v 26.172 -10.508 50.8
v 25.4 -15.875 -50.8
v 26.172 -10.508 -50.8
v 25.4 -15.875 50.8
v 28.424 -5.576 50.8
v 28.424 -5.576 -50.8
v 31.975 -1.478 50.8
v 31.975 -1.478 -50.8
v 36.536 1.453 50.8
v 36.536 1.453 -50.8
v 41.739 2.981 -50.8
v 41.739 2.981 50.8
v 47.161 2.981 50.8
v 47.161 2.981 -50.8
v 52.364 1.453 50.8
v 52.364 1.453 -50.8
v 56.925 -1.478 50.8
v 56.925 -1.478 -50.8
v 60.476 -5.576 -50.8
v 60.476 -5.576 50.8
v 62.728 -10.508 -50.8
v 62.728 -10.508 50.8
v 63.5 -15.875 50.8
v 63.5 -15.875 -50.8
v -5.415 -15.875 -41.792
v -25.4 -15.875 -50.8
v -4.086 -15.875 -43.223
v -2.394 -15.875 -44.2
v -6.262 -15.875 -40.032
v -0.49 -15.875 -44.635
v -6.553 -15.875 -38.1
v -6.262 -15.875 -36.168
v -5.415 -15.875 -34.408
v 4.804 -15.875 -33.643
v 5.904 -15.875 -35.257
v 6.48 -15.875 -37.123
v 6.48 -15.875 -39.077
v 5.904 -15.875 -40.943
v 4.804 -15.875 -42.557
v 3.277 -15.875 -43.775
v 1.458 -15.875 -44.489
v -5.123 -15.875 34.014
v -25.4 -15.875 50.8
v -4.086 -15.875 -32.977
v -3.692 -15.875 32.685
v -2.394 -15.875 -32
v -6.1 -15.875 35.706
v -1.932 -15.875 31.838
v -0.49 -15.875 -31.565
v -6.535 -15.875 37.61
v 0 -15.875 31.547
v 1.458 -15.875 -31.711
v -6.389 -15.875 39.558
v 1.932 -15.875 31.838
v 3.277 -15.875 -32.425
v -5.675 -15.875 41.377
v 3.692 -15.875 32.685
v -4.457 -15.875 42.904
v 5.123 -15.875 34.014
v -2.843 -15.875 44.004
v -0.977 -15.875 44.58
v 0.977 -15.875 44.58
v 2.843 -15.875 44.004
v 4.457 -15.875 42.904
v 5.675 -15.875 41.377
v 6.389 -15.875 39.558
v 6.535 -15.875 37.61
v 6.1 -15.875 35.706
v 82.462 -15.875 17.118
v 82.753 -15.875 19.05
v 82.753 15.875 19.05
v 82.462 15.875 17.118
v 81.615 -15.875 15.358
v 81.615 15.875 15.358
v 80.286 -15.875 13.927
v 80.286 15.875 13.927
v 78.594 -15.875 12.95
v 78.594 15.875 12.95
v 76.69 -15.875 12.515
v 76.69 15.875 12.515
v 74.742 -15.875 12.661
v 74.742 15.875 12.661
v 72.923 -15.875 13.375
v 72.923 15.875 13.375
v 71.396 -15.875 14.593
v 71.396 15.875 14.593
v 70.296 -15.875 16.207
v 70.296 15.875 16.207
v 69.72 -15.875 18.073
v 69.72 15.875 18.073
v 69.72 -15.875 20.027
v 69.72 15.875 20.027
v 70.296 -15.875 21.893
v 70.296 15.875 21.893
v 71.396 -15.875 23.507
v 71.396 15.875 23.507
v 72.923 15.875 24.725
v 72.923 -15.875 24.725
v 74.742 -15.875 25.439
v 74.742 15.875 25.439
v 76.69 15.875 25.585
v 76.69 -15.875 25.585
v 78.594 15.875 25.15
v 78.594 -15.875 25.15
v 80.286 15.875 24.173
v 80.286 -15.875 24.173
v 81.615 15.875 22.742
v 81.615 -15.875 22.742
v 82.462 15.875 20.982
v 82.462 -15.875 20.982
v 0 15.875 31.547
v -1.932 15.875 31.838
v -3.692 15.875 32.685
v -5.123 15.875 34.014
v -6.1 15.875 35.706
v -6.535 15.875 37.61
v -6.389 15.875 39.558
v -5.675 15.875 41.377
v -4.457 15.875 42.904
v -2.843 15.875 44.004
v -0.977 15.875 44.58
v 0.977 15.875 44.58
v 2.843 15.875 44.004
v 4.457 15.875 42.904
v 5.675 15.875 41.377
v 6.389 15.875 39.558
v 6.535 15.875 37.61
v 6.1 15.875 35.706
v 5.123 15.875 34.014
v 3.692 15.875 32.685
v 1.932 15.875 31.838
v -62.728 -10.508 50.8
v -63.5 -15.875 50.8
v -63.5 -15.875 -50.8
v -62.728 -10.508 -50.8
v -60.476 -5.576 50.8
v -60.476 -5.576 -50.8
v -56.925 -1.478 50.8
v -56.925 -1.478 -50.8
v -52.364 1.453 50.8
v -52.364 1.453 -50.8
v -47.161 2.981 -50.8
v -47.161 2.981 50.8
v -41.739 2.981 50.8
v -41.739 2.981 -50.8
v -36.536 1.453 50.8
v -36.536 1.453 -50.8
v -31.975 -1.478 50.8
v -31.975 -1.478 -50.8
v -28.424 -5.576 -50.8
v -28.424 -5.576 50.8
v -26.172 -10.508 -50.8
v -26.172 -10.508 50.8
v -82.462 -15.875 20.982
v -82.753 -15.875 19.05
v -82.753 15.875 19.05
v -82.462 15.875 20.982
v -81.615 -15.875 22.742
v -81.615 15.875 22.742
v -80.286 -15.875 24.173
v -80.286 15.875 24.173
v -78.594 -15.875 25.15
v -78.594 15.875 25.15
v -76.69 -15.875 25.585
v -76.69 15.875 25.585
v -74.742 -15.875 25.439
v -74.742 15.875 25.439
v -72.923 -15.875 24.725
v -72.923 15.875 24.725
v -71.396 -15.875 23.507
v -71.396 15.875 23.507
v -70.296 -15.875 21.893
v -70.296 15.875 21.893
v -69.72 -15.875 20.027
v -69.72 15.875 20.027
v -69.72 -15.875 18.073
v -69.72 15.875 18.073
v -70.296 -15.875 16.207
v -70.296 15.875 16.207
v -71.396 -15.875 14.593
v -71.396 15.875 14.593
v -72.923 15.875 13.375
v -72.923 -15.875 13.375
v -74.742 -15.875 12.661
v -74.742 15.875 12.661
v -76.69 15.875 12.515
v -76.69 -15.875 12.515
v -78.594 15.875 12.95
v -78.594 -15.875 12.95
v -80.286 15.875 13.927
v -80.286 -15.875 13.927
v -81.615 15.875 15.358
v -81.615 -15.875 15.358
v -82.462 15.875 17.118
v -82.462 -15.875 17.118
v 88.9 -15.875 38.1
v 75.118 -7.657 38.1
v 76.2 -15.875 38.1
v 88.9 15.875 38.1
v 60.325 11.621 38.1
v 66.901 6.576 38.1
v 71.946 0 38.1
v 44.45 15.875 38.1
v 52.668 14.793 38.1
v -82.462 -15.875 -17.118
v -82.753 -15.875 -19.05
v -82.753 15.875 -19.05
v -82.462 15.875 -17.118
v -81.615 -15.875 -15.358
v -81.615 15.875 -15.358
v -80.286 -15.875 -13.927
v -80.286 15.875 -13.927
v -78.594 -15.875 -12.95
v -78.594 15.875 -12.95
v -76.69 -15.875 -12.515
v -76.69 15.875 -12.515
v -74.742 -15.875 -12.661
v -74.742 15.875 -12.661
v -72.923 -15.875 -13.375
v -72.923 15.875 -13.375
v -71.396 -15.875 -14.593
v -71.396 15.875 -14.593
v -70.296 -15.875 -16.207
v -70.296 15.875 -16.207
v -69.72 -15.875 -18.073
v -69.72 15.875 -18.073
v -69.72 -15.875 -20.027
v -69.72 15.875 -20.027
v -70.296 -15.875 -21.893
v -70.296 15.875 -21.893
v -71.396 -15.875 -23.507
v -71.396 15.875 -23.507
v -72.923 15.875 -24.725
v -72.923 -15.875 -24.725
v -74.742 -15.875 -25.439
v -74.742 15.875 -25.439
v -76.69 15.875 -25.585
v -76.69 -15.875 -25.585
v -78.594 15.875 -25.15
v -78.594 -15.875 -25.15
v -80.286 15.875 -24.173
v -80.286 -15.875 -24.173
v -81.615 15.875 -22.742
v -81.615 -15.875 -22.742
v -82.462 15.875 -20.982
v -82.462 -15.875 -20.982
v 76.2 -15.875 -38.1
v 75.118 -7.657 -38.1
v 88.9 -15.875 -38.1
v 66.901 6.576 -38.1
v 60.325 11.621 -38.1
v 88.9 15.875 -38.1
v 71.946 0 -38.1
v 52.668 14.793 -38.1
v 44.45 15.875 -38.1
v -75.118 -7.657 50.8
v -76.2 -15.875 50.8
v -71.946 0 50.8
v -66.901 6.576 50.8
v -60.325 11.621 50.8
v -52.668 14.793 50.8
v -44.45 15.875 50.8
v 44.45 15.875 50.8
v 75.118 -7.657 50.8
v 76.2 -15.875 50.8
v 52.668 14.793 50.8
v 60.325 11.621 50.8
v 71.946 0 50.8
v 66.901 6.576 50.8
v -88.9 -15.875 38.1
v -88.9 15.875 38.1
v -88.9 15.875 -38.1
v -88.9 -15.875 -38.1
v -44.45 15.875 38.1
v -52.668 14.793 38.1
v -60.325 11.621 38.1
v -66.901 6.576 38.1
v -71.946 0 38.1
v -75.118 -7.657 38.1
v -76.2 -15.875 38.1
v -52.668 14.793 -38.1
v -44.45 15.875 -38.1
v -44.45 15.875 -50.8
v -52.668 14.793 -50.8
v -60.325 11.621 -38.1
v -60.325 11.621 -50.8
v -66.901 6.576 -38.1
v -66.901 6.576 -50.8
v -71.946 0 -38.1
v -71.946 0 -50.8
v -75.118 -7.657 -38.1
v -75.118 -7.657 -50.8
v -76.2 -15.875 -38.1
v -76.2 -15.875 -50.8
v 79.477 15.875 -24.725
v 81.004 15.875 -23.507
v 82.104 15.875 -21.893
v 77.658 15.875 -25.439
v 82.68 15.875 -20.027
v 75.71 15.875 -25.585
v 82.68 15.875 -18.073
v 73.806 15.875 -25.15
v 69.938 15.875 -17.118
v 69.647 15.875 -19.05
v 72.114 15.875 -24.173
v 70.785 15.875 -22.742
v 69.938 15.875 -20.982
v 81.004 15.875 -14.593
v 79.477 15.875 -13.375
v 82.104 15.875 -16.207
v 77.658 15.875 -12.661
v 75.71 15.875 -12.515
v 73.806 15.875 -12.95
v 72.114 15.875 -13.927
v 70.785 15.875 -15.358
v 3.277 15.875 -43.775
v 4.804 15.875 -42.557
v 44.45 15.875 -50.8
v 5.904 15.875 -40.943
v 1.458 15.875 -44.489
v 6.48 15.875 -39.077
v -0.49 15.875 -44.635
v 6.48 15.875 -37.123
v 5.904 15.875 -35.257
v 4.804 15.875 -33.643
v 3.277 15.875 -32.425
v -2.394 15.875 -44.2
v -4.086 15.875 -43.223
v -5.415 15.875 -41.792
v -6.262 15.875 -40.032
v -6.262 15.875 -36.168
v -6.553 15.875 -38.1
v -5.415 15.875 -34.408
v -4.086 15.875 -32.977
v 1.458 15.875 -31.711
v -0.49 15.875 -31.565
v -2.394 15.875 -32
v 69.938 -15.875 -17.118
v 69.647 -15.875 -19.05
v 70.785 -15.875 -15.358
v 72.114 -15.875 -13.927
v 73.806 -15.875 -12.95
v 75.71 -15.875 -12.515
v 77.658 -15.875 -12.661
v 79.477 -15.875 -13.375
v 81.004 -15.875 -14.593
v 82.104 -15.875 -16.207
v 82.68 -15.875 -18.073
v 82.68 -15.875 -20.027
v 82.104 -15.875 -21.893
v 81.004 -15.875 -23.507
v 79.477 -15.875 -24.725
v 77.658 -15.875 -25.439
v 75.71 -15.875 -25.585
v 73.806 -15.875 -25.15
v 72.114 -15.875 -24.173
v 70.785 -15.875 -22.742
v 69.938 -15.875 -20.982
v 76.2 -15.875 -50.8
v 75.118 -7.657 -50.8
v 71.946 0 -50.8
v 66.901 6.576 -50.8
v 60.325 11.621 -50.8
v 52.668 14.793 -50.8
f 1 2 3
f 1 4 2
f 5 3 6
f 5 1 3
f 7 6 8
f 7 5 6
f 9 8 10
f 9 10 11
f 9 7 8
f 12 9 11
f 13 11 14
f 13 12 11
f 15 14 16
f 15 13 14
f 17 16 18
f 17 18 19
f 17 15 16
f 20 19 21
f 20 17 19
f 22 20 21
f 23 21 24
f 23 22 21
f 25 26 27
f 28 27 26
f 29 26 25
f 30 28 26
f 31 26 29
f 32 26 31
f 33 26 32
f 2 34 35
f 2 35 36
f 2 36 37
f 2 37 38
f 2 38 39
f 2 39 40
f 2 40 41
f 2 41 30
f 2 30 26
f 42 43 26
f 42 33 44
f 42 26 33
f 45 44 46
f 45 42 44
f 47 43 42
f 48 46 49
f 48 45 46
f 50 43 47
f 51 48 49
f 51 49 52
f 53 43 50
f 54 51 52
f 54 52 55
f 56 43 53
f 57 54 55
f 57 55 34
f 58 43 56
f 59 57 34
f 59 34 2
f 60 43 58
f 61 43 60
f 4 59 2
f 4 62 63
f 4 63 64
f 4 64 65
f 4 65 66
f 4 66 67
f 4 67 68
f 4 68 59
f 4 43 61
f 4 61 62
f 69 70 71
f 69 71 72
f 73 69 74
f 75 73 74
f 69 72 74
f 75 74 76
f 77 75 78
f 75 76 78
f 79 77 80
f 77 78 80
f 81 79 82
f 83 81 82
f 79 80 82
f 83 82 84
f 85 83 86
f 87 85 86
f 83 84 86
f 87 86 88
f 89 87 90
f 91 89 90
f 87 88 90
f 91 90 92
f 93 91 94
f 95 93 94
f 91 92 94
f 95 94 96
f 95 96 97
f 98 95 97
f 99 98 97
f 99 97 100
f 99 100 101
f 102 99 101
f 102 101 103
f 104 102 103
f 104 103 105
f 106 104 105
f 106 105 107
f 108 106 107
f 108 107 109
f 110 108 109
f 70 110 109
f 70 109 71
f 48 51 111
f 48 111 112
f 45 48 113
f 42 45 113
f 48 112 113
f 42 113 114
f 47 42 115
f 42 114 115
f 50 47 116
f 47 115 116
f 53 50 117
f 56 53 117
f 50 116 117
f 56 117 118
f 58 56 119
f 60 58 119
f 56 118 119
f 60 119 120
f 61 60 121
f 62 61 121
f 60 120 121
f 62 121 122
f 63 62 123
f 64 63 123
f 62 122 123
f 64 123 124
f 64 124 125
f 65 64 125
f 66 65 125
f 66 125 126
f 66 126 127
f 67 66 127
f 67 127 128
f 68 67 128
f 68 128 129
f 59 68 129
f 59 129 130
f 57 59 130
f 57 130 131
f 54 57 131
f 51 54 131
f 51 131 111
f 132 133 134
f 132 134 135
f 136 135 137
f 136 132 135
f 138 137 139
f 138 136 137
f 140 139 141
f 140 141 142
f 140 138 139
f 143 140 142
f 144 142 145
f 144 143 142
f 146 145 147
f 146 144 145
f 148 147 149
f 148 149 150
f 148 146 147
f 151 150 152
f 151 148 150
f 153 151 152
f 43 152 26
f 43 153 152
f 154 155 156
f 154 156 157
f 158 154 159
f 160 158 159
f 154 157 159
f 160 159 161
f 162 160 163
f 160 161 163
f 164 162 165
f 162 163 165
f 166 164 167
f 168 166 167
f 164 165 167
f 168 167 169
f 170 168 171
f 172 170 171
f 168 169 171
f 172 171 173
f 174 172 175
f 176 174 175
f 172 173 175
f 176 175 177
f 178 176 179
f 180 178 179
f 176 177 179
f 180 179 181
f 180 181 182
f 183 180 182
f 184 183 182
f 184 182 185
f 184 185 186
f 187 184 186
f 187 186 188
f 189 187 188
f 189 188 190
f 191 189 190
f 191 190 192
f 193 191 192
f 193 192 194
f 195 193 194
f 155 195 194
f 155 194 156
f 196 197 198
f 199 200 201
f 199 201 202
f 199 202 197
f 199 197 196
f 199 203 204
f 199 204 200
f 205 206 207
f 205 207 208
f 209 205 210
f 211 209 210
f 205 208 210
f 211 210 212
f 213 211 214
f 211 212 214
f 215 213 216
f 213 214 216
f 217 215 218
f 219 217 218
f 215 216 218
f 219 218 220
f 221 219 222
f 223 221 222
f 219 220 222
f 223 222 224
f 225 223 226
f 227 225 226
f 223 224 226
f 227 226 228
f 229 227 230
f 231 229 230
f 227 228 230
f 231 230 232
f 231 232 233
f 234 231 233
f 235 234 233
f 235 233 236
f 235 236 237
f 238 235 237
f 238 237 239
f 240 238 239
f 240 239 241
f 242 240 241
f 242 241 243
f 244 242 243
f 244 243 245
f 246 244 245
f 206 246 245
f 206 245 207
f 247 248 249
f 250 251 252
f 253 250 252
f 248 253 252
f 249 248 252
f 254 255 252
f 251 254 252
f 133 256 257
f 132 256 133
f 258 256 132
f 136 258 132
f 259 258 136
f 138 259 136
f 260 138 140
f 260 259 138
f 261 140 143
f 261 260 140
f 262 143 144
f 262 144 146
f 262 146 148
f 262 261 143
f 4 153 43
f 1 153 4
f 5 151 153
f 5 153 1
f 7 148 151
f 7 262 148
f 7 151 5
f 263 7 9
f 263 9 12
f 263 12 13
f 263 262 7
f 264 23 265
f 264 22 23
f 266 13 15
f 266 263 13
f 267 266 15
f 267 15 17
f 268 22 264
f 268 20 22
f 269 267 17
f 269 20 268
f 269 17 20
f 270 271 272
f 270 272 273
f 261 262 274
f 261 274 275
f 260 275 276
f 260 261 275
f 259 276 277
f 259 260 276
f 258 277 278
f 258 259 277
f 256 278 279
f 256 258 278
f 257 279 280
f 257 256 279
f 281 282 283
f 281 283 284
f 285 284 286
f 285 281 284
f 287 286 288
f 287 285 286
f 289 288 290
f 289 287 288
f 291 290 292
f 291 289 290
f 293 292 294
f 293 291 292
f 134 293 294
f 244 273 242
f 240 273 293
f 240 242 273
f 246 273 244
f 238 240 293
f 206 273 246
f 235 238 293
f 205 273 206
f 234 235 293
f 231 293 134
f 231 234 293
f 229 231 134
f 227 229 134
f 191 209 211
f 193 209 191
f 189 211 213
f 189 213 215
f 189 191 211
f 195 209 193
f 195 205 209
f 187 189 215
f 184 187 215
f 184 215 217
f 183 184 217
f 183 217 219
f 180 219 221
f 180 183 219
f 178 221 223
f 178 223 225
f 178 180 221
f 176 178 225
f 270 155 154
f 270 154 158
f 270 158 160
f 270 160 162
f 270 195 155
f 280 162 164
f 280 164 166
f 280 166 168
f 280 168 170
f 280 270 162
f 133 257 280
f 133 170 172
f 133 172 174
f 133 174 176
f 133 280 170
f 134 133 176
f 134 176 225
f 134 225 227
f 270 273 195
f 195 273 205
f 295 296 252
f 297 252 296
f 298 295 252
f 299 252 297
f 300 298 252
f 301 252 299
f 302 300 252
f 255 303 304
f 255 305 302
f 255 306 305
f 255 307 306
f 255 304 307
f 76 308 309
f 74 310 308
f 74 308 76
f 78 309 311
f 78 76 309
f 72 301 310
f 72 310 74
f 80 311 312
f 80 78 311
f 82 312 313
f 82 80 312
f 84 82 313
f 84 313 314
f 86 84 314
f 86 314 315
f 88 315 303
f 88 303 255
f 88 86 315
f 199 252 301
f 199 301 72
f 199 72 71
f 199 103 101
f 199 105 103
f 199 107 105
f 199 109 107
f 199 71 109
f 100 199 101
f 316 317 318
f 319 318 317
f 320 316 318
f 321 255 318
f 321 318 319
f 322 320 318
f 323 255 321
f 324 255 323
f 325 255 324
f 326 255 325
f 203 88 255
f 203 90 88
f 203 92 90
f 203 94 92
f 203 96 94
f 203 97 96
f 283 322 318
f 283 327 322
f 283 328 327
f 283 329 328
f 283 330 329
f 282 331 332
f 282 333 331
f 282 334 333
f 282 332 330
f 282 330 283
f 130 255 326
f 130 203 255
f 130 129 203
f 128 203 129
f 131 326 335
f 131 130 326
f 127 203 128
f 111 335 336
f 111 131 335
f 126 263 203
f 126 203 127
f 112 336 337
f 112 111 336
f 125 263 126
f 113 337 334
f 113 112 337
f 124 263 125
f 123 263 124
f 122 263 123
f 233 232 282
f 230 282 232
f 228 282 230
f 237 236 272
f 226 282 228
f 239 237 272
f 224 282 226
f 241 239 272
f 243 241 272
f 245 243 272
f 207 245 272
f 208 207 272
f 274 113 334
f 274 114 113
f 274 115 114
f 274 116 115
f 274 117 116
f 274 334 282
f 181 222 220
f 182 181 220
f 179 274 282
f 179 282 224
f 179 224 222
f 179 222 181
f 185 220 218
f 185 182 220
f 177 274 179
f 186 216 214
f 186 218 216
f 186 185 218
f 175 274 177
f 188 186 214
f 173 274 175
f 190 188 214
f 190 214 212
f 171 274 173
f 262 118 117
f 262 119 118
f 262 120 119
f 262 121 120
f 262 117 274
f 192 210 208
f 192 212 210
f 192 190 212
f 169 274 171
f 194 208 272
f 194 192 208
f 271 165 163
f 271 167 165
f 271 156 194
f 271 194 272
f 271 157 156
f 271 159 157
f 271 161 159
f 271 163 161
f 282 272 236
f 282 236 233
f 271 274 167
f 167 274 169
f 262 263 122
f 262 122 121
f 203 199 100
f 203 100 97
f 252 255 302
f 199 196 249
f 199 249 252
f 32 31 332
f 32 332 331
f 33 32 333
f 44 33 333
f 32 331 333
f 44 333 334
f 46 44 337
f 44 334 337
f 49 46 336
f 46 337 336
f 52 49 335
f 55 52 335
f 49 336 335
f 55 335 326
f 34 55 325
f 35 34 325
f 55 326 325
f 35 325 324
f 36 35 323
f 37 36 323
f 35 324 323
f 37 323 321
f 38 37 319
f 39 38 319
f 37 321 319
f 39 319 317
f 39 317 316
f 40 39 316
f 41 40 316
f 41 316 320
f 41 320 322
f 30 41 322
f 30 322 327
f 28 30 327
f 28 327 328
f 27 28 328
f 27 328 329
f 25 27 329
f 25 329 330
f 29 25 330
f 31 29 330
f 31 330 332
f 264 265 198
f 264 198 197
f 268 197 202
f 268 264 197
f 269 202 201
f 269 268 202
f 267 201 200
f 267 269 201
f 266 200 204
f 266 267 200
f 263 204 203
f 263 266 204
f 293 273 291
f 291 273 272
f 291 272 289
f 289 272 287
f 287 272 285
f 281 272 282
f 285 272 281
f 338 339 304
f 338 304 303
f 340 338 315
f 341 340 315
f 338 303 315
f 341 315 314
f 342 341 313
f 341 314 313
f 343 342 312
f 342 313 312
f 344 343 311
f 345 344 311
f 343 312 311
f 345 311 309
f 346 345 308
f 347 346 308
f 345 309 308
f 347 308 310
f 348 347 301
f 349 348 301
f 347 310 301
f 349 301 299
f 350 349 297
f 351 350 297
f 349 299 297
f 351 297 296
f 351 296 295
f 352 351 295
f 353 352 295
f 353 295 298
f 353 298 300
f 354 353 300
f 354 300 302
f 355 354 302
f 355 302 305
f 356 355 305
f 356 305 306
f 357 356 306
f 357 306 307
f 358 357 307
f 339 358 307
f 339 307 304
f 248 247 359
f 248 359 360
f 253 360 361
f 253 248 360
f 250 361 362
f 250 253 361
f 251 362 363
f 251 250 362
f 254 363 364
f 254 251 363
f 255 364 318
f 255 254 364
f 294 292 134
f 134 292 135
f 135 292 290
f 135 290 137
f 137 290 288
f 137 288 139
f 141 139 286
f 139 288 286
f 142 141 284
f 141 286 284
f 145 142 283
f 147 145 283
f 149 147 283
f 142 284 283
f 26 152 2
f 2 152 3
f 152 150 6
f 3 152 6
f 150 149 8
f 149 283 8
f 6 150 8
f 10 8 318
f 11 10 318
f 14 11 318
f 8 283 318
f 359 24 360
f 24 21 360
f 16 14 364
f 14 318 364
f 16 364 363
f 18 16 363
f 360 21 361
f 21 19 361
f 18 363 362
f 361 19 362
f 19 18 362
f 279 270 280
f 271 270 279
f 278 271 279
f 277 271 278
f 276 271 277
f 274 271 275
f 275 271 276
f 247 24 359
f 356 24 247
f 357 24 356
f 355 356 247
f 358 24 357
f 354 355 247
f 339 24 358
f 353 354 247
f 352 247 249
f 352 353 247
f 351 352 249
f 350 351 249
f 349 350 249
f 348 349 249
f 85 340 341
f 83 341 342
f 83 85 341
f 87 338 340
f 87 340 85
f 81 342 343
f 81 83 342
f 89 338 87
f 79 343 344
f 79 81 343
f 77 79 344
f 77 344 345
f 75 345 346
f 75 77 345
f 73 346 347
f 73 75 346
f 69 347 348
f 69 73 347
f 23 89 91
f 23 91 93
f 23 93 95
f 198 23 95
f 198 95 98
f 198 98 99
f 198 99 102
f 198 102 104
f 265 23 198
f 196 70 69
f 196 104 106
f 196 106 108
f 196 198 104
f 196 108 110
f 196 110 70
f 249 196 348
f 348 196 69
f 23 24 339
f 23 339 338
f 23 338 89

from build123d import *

# Parameters (mm, degrees)
BOSS_EXTRUDE9_DEPTH   = 38.1
BOSS_EXTRUDE9_2_DEPTH = 38.1
BOSS_EXTRUDE10_DEPTH  = 50.8
SKETCH3_R             = 6.5532
CUT_EXTRUDE3_DEPTH    = 101.6


with BuildPart() as part:
    # Sketch1 → Boss-Extrude9 (new, symmetric)
    with BuildSketch(Plane.XY):
        with BuildLine():
            Line((76.2, -15.875), (88.9, -15.875))
            Line((88.9, -15.875), (88.9, 15.875))
            Line((88.9, 15.875), (44.45, 15.875))
            ThreePointArc((44.45, 15.875), (66.900640303, 6.575640303), (76.2, -15.875))
        make_face()
    extrude(amount=BOSS_EXTRUDE9_DEPTH, both=True)



with BuildPart() as body_2:
    # Sketch1 → Boss-Extrude9 2 (new, symmetric)
    with BuildSketch(Plane.XY):
        with BuildLine():
            ThreePointArc((-76.2, -15.875), (-66.900640303, 6.575640303), (-44.45, 15.875))
            Line((-44.45, 15.875), (-88.9, 15.875))
            Line((-88.9, 15.875), (-88.9, -15.875))
            Line((-88.9, -15.875), (-76.2, -15.875))
        make_face()
    extrude(amount=BOSS_EXTRUDE9_2_DEPTH, both=True)


with BuildPart() as part_1:
    add(part.part)

    add(body_2.part)  # Boss-Extrude10 merges body 2
    # Sketch1<11> → Boss-Extrude10 (add, symmetric)
    with BuildSketch(Plane.XY):
        with BuildLine():
            Line((63.5, -15.875), (76.2, -15.875))
            ThreePointArc((76.2, -15.875), (66.900640303, 6.575640303), (44.45, 15.875))
            Line((44.45, 15.875), (-44.45, 15.875))
            ThreePointArc((-44.45, 15.875), (-66.900640303, 6.575640303), (-76.2, -15.875))
            Line((-76.2, -15.875), (-63.5, -15.875))
            ThreePointArc((-63.5, -15.875), (-44.45, 3.175), (-25.4, -15.875))
            Line((-25.4, -15.875), (2.119780236, -15.875))
            Line((2.119780236, -15.875), (25.4, -15.875))
            ThreePointArc((25.4, -15.875), (44.45, 3.175), (63.5, -15.875))
        make_face()
    extrude(amount=BOSS_EXTRUDE10_DEPTH, both=True)

    # Sketch3 → Cut-Extrude3 (cut)
    with BuildSketch(Plane(origin=(0, 15.875, 0), x_dir=(1, 0, 0), z_dir=(0, 1, 0))):
        with Locations((-76.2, 19.05)):
            Circle(SKETCH3_R)
        with Locations((0, 38.1)):
            Circle(SKETCH3_R)
        with Locations((76.2, 19.05)):
            Circle(SKETCH3_R)
        with Locations((76.2, -19.05)):
            Circle(SKETCH3_R)
        with Locations((0, -38.1)):
            Circle(SKETCH3_R)
        with Locations((-76.2, -19.05)):
            Circle(SKETCH3_R)
    extrude(amount=-CUT_EXTRUDE3_DEPTH, mode=Mode.SUBTRACT)


solid = part_1.part
